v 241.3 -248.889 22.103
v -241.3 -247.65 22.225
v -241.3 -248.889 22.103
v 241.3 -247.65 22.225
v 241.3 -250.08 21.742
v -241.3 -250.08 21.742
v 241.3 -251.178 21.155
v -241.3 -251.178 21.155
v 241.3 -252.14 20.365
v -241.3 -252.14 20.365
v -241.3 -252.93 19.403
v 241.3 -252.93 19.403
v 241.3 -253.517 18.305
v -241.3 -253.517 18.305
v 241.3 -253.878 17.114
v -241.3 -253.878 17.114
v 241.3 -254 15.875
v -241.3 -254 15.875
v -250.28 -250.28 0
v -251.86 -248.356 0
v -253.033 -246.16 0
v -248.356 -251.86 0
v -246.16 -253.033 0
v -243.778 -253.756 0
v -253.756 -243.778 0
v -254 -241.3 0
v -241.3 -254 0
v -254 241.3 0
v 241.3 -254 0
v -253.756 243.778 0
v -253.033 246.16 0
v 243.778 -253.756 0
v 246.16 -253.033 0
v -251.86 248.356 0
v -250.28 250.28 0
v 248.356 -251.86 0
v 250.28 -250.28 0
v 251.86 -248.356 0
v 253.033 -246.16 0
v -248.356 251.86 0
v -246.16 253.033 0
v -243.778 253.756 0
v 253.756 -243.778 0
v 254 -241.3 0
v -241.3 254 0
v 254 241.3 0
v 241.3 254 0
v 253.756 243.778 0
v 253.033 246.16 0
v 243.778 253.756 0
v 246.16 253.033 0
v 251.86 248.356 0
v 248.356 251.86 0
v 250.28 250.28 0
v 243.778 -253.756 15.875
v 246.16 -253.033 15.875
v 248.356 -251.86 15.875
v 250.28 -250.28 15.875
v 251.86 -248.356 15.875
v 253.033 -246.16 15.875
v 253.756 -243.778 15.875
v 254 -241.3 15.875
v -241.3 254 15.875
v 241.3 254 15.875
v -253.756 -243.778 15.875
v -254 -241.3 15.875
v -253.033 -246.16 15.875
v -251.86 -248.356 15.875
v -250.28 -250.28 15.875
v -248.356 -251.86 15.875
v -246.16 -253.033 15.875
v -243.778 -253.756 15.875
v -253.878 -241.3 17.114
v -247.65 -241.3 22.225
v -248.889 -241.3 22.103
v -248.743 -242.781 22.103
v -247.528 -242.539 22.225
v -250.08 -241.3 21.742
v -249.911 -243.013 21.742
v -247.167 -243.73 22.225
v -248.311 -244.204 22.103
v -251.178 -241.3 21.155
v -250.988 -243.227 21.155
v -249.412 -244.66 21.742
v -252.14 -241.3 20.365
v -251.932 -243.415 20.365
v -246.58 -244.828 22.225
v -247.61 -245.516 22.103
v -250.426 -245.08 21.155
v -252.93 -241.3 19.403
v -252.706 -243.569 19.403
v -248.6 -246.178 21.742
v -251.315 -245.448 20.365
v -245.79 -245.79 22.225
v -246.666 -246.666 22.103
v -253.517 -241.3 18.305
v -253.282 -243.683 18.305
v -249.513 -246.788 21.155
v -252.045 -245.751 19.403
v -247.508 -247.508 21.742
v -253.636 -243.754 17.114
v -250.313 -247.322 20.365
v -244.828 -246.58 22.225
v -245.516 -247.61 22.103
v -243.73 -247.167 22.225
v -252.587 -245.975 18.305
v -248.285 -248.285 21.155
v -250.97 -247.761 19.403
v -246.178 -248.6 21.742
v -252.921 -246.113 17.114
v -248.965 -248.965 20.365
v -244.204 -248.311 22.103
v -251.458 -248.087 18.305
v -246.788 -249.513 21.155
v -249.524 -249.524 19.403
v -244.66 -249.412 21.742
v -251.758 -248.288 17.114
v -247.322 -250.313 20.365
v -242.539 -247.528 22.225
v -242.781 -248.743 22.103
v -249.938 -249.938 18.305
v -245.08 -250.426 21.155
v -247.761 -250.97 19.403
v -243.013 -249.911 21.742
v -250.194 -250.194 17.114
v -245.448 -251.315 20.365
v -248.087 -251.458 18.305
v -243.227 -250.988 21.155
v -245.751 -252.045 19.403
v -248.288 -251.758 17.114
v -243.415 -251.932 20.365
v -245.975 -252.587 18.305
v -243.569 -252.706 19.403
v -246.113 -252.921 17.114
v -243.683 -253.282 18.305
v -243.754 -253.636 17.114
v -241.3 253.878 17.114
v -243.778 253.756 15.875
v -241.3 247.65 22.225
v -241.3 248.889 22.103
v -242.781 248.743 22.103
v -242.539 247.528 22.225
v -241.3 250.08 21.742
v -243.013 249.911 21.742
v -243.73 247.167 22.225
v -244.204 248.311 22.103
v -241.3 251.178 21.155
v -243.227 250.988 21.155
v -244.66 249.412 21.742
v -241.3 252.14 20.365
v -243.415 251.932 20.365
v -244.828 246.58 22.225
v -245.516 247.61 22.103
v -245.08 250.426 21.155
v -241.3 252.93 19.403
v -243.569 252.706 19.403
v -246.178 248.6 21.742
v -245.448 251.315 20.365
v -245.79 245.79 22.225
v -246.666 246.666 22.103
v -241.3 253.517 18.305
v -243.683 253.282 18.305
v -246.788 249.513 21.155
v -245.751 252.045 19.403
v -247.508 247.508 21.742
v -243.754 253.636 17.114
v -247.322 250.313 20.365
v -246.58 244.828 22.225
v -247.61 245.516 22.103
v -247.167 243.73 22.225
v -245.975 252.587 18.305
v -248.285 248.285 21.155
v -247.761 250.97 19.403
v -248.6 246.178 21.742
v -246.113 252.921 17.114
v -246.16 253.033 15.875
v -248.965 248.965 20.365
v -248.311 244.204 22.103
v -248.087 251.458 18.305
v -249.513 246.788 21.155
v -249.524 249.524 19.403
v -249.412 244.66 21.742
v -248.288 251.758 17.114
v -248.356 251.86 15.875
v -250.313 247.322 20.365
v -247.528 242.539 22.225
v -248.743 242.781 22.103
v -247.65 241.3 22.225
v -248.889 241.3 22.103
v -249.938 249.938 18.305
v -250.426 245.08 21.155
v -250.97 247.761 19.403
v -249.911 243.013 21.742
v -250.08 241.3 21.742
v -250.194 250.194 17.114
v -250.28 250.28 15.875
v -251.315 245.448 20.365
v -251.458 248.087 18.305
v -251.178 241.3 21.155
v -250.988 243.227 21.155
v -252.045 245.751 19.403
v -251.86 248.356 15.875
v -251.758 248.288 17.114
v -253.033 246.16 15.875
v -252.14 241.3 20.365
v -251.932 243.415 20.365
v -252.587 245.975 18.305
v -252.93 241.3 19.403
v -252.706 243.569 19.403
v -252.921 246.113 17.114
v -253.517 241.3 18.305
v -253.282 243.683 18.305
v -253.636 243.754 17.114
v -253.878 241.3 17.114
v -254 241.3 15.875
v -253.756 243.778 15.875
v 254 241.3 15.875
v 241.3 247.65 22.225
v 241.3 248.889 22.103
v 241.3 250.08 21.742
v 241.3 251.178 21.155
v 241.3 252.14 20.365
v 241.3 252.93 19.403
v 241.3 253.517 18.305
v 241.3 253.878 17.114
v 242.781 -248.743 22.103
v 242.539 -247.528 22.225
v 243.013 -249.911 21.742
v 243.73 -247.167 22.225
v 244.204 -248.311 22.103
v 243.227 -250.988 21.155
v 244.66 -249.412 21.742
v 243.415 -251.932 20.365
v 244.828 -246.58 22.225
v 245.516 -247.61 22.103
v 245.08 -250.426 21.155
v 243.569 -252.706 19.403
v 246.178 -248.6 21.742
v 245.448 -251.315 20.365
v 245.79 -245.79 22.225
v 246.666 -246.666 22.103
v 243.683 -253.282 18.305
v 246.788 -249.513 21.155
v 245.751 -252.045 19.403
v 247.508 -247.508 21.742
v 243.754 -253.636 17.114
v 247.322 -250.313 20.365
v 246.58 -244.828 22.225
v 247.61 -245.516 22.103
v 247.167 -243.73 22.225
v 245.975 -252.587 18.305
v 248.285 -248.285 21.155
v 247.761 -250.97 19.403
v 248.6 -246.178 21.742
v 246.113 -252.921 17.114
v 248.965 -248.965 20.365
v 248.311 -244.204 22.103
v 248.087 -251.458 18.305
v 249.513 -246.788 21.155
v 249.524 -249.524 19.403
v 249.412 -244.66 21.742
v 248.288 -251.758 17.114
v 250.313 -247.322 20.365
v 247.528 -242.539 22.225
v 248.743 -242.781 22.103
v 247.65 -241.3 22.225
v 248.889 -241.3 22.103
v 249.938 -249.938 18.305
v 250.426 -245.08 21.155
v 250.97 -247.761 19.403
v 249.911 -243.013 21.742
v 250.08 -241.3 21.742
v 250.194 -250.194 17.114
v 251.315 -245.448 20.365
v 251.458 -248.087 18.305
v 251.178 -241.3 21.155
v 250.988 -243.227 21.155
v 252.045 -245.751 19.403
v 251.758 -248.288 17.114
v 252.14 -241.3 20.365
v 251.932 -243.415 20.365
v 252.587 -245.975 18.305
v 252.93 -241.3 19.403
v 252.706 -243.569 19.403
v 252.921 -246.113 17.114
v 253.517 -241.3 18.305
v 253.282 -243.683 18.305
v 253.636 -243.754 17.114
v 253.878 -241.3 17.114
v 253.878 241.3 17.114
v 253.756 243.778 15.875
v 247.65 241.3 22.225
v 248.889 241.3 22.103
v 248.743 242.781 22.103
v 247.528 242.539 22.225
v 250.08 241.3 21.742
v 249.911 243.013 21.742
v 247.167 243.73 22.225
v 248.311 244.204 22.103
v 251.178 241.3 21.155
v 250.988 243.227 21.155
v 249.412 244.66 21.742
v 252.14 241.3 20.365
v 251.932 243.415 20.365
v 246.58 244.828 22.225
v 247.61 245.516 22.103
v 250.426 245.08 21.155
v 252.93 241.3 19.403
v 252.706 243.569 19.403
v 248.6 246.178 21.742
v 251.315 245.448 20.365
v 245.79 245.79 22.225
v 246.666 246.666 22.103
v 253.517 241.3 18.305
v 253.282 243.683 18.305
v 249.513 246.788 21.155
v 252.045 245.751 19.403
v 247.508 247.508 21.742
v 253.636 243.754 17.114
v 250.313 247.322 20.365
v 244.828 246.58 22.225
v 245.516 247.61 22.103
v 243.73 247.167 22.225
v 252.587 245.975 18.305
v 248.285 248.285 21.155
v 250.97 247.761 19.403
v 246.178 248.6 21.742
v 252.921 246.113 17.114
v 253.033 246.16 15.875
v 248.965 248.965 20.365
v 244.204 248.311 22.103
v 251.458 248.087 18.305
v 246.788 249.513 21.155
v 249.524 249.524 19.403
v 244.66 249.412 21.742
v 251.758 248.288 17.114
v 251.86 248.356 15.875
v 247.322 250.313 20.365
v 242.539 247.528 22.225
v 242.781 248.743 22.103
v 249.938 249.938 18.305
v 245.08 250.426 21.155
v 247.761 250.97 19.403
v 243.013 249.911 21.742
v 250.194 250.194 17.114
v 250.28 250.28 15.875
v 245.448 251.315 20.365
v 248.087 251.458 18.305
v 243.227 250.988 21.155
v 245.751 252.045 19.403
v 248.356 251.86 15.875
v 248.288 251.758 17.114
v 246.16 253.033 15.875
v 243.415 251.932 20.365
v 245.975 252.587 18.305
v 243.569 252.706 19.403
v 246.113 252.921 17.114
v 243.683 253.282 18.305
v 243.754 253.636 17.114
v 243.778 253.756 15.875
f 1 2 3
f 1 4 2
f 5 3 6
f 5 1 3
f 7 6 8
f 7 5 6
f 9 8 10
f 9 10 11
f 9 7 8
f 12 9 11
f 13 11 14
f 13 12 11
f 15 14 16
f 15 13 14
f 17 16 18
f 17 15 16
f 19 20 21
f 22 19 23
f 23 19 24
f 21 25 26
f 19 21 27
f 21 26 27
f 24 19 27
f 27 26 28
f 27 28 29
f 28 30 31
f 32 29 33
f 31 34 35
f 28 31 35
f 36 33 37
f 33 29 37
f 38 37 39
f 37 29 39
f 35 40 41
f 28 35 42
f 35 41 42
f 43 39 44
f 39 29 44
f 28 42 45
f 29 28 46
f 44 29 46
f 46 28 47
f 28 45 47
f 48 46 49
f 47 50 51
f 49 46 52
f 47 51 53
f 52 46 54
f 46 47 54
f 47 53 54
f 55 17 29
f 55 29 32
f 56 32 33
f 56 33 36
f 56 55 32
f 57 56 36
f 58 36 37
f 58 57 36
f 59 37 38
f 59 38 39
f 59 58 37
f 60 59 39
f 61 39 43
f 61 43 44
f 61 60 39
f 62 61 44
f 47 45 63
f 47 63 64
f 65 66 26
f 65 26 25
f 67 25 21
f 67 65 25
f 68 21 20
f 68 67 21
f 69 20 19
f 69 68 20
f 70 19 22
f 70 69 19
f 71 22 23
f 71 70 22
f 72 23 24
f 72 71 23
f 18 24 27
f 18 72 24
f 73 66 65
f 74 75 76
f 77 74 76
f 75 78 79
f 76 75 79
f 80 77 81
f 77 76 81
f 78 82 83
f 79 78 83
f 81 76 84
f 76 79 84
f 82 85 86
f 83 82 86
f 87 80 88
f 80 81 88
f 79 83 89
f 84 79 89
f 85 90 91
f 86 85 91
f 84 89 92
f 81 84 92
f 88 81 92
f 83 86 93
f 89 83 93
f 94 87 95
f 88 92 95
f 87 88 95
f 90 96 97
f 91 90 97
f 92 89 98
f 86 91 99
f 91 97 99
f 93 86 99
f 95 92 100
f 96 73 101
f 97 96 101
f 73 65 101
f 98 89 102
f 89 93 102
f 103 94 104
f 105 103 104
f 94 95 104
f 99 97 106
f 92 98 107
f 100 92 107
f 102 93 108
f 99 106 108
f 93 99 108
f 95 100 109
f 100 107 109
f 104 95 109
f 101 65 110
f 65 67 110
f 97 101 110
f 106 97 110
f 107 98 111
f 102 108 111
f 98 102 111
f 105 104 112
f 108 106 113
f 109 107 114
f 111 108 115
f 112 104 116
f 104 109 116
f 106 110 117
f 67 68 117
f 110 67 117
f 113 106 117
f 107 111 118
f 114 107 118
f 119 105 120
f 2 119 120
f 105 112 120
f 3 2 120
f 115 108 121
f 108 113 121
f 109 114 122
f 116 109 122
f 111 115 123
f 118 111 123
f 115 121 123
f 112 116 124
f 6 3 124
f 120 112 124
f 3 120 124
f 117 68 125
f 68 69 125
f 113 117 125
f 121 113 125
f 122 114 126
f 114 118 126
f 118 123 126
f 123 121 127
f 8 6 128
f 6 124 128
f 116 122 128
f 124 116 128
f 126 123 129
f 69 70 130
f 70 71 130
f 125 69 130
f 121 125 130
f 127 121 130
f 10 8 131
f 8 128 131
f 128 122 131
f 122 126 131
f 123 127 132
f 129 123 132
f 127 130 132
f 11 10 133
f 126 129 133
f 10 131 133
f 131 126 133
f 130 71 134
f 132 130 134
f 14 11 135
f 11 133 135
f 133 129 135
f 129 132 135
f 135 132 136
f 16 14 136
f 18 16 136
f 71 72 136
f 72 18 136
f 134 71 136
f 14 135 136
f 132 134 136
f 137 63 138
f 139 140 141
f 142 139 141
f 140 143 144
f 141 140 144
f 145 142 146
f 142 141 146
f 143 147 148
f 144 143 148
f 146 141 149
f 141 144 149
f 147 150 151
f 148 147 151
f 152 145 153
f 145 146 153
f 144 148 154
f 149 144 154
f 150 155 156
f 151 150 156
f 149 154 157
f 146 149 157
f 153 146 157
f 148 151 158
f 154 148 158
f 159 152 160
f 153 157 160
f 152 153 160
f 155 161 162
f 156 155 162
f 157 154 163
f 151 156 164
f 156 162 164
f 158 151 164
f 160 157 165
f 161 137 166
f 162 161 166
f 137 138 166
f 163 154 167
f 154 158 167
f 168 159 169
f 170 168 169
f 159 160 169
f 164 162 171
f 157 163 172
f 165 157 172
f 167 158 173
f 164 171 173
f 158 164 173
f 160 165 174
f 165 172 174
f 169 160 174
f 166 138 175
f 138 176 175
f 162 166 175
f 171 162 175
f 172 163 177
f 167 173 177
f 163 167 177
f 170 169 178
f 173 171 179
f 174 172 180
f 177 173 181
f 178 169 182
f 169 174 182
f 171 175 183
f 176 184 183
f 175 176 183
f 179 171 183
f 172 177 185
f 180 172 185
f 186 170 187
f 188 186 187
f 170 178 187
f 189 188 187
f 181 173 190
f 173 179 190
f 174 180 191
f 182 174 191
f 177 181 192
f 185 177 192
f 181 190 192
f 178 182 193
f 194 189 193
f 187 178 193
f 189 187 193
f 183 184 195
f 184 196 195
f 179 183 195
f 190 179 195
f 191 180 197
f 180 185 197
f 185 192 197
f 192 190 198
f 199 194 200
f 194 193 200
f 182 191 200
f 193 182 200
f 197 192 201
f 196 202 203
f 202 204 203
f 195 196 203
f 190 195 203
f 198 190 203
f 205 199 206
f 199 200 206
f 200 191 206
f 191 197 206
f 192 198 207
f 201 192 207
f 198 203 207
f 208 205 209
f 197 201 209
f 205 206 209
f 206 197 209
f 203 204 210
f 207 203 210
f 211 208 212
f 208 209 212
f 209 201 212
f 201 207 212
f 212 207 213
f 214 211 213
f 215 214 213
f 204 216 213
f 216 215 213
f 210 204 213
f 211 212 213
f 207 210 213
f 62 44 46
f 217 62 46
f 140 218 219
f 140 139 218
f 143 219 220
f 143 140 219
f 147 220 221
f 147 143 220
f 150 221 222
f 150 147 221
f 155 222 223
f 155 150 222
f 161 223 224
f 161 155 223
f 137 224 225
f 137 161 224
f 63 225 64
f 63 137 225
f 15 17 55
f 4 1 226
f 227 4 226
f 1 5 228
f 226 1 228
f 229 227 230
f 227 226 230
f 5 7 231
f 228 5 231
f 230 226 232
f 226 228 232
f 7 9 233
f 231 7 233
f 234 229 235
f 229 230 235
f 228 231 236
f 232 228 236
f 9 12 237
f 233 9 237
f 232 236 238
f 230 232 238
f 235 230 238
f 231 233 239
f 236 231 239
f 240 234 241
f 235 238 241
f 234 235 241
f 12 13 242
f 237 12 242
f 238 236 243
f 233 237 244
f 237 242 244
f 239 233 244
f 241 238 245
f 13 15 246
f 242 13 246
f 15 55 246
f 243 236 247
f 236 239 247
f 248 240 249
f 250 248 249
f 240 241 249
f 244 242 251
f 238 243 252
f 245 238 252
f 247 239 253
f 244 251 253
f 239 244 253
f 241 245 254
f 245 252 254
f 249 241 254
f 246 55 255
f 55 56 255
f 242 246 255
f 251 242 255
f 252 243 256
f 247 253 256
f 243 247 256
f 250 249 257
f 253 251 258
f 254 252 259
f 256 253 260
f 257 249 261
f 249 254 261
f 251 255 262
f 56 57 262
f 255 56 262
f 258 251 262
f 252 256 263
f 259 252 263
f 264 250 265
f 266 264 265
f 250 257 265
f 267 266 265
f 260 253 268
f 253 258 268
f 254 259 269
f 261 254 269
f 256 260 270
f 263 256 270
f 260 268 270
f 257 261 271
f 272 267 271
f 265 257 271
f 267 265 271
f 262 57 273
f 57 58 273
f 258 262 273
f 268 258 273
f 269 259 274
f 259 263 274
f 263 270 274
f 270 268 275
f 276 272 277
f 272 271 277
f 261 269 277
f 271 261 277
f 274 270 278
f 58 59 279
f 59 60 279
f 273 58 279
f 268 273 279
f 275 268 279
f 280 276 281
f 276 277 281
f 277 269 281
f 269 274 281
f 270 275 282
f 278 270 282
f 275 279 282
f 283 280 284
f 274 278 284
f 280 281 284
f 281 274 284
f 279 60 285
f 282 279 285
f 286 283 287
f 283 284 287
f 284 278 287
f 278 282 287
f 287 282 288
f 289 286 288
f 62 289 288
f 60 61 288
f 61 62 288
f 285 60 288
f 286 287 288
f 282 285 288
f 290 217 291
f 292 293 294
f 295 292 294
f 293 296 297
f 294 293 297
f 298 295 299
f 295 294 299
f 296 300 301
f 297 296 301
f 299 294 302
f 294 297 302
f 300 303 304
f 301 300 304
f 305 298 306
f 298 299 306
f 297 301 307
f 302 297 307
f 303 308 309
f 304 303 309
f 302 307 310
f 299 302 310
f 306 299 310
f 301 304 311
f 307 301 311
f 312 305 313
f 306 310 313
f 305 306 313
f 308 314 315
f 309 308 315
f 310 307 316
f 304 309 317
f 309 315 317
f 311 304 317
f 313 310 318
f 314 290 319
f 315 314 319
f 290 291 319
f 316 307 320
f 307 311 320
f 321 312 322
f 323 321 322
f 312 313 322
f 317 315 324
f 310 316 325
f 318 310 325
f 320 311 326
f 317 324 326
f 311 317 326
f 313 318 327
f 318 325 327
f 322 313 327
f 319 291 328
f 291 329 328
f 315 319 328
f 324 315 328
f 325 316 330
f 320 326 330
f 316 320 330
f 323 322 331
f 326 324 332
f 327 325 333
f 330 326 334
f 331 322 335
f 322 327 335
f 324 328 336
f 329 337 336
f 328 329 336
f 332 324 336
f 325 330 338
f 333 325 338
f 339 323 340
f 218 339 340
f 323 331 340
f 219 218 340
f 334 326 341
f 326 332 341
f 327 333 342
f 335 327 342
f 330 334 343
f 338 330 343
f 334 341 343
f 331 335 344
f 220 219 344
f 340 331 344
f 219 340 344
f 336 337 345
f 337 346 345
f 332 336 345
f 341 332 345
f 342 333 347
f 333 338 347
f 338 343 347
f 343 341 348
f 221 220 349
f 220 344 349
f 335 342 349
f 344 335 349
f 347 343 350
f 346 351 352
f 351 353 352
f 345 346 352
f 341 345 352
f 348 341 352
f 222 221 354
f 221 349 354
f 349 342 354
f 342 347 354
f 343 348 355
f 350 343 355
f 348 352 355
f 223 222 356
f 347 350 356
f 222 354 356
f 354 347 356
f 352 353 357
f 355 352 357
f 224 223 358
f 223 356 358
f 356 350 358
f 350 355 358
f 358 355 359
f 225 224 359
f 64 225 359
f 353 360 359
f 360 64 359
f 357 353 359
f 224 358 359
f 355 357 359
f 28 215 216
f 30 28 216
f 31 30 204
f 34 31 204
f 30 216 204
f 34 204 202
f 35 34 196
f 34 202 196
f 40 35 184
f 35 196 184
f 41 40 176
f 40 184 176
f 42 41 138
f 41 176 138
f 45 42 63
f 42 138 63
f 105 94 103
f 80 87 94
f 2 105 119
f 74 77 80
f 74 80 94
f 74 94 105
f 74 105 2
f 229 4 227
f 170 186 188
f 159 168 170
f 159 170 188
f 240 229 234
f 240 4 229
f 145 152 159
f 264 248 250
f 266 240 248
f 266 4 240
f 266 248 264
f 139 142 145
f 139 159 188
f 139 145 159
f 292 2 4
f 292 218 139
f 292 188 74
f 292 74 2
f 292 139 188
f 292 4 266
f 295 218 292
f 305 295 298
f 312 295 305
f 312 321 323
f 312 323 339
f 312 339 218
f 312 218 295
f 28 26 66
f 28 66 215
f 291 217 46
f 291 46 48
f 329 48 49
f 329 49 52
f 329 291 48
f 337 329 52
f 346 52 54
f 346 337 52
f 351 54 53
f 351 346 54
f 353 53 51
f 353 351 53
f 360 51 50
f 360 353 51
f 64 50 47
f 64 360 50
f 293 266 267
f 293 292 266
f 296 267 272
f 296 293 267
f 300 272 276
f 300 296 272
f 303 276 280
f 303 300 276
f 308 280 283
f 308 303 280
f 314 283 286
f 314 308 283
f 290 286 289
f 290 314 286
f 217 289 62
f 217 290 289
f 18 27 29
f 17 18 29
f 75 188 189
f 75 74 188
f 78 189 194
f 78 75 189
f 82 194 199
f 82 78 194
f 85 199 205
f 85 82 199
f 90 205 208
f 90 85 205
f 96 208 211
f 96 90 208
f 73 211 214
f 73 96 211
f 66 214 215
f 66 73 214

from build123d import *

# Parameters (mm, degrees)
F0_W     = 508
F0_H     = 508
F1_DEPTH = 22.225
F2_R     = 12.7
F3_R     = 6.35


with BuildPart() as f1:
    # F0 (on Top) → F1 (new body)
    with BuildSketch(Plane.XY):
        Rectangle(F0_W, F0_H)
    extrude(amount=F1_DEPTH)

    # F2
    f2_edges = [f1.edges().sort_by_distance(p)[0] for p in [
        (-254, -254, 11.1125),
        (254, -254, 11.1125),
        (254, 254, 11.1125),
        (-254, 254, 11.1125),
    ]]
    fillet(f2_edges, radius=F2_R)

    # F3
    f3_edges = [f1.edges().sort_by_distance(p)[0] for p in [
        (0, -254, 22.225),
    ]]
    fillet(f3_edges, radius=F3_R)


solid = f1.part
